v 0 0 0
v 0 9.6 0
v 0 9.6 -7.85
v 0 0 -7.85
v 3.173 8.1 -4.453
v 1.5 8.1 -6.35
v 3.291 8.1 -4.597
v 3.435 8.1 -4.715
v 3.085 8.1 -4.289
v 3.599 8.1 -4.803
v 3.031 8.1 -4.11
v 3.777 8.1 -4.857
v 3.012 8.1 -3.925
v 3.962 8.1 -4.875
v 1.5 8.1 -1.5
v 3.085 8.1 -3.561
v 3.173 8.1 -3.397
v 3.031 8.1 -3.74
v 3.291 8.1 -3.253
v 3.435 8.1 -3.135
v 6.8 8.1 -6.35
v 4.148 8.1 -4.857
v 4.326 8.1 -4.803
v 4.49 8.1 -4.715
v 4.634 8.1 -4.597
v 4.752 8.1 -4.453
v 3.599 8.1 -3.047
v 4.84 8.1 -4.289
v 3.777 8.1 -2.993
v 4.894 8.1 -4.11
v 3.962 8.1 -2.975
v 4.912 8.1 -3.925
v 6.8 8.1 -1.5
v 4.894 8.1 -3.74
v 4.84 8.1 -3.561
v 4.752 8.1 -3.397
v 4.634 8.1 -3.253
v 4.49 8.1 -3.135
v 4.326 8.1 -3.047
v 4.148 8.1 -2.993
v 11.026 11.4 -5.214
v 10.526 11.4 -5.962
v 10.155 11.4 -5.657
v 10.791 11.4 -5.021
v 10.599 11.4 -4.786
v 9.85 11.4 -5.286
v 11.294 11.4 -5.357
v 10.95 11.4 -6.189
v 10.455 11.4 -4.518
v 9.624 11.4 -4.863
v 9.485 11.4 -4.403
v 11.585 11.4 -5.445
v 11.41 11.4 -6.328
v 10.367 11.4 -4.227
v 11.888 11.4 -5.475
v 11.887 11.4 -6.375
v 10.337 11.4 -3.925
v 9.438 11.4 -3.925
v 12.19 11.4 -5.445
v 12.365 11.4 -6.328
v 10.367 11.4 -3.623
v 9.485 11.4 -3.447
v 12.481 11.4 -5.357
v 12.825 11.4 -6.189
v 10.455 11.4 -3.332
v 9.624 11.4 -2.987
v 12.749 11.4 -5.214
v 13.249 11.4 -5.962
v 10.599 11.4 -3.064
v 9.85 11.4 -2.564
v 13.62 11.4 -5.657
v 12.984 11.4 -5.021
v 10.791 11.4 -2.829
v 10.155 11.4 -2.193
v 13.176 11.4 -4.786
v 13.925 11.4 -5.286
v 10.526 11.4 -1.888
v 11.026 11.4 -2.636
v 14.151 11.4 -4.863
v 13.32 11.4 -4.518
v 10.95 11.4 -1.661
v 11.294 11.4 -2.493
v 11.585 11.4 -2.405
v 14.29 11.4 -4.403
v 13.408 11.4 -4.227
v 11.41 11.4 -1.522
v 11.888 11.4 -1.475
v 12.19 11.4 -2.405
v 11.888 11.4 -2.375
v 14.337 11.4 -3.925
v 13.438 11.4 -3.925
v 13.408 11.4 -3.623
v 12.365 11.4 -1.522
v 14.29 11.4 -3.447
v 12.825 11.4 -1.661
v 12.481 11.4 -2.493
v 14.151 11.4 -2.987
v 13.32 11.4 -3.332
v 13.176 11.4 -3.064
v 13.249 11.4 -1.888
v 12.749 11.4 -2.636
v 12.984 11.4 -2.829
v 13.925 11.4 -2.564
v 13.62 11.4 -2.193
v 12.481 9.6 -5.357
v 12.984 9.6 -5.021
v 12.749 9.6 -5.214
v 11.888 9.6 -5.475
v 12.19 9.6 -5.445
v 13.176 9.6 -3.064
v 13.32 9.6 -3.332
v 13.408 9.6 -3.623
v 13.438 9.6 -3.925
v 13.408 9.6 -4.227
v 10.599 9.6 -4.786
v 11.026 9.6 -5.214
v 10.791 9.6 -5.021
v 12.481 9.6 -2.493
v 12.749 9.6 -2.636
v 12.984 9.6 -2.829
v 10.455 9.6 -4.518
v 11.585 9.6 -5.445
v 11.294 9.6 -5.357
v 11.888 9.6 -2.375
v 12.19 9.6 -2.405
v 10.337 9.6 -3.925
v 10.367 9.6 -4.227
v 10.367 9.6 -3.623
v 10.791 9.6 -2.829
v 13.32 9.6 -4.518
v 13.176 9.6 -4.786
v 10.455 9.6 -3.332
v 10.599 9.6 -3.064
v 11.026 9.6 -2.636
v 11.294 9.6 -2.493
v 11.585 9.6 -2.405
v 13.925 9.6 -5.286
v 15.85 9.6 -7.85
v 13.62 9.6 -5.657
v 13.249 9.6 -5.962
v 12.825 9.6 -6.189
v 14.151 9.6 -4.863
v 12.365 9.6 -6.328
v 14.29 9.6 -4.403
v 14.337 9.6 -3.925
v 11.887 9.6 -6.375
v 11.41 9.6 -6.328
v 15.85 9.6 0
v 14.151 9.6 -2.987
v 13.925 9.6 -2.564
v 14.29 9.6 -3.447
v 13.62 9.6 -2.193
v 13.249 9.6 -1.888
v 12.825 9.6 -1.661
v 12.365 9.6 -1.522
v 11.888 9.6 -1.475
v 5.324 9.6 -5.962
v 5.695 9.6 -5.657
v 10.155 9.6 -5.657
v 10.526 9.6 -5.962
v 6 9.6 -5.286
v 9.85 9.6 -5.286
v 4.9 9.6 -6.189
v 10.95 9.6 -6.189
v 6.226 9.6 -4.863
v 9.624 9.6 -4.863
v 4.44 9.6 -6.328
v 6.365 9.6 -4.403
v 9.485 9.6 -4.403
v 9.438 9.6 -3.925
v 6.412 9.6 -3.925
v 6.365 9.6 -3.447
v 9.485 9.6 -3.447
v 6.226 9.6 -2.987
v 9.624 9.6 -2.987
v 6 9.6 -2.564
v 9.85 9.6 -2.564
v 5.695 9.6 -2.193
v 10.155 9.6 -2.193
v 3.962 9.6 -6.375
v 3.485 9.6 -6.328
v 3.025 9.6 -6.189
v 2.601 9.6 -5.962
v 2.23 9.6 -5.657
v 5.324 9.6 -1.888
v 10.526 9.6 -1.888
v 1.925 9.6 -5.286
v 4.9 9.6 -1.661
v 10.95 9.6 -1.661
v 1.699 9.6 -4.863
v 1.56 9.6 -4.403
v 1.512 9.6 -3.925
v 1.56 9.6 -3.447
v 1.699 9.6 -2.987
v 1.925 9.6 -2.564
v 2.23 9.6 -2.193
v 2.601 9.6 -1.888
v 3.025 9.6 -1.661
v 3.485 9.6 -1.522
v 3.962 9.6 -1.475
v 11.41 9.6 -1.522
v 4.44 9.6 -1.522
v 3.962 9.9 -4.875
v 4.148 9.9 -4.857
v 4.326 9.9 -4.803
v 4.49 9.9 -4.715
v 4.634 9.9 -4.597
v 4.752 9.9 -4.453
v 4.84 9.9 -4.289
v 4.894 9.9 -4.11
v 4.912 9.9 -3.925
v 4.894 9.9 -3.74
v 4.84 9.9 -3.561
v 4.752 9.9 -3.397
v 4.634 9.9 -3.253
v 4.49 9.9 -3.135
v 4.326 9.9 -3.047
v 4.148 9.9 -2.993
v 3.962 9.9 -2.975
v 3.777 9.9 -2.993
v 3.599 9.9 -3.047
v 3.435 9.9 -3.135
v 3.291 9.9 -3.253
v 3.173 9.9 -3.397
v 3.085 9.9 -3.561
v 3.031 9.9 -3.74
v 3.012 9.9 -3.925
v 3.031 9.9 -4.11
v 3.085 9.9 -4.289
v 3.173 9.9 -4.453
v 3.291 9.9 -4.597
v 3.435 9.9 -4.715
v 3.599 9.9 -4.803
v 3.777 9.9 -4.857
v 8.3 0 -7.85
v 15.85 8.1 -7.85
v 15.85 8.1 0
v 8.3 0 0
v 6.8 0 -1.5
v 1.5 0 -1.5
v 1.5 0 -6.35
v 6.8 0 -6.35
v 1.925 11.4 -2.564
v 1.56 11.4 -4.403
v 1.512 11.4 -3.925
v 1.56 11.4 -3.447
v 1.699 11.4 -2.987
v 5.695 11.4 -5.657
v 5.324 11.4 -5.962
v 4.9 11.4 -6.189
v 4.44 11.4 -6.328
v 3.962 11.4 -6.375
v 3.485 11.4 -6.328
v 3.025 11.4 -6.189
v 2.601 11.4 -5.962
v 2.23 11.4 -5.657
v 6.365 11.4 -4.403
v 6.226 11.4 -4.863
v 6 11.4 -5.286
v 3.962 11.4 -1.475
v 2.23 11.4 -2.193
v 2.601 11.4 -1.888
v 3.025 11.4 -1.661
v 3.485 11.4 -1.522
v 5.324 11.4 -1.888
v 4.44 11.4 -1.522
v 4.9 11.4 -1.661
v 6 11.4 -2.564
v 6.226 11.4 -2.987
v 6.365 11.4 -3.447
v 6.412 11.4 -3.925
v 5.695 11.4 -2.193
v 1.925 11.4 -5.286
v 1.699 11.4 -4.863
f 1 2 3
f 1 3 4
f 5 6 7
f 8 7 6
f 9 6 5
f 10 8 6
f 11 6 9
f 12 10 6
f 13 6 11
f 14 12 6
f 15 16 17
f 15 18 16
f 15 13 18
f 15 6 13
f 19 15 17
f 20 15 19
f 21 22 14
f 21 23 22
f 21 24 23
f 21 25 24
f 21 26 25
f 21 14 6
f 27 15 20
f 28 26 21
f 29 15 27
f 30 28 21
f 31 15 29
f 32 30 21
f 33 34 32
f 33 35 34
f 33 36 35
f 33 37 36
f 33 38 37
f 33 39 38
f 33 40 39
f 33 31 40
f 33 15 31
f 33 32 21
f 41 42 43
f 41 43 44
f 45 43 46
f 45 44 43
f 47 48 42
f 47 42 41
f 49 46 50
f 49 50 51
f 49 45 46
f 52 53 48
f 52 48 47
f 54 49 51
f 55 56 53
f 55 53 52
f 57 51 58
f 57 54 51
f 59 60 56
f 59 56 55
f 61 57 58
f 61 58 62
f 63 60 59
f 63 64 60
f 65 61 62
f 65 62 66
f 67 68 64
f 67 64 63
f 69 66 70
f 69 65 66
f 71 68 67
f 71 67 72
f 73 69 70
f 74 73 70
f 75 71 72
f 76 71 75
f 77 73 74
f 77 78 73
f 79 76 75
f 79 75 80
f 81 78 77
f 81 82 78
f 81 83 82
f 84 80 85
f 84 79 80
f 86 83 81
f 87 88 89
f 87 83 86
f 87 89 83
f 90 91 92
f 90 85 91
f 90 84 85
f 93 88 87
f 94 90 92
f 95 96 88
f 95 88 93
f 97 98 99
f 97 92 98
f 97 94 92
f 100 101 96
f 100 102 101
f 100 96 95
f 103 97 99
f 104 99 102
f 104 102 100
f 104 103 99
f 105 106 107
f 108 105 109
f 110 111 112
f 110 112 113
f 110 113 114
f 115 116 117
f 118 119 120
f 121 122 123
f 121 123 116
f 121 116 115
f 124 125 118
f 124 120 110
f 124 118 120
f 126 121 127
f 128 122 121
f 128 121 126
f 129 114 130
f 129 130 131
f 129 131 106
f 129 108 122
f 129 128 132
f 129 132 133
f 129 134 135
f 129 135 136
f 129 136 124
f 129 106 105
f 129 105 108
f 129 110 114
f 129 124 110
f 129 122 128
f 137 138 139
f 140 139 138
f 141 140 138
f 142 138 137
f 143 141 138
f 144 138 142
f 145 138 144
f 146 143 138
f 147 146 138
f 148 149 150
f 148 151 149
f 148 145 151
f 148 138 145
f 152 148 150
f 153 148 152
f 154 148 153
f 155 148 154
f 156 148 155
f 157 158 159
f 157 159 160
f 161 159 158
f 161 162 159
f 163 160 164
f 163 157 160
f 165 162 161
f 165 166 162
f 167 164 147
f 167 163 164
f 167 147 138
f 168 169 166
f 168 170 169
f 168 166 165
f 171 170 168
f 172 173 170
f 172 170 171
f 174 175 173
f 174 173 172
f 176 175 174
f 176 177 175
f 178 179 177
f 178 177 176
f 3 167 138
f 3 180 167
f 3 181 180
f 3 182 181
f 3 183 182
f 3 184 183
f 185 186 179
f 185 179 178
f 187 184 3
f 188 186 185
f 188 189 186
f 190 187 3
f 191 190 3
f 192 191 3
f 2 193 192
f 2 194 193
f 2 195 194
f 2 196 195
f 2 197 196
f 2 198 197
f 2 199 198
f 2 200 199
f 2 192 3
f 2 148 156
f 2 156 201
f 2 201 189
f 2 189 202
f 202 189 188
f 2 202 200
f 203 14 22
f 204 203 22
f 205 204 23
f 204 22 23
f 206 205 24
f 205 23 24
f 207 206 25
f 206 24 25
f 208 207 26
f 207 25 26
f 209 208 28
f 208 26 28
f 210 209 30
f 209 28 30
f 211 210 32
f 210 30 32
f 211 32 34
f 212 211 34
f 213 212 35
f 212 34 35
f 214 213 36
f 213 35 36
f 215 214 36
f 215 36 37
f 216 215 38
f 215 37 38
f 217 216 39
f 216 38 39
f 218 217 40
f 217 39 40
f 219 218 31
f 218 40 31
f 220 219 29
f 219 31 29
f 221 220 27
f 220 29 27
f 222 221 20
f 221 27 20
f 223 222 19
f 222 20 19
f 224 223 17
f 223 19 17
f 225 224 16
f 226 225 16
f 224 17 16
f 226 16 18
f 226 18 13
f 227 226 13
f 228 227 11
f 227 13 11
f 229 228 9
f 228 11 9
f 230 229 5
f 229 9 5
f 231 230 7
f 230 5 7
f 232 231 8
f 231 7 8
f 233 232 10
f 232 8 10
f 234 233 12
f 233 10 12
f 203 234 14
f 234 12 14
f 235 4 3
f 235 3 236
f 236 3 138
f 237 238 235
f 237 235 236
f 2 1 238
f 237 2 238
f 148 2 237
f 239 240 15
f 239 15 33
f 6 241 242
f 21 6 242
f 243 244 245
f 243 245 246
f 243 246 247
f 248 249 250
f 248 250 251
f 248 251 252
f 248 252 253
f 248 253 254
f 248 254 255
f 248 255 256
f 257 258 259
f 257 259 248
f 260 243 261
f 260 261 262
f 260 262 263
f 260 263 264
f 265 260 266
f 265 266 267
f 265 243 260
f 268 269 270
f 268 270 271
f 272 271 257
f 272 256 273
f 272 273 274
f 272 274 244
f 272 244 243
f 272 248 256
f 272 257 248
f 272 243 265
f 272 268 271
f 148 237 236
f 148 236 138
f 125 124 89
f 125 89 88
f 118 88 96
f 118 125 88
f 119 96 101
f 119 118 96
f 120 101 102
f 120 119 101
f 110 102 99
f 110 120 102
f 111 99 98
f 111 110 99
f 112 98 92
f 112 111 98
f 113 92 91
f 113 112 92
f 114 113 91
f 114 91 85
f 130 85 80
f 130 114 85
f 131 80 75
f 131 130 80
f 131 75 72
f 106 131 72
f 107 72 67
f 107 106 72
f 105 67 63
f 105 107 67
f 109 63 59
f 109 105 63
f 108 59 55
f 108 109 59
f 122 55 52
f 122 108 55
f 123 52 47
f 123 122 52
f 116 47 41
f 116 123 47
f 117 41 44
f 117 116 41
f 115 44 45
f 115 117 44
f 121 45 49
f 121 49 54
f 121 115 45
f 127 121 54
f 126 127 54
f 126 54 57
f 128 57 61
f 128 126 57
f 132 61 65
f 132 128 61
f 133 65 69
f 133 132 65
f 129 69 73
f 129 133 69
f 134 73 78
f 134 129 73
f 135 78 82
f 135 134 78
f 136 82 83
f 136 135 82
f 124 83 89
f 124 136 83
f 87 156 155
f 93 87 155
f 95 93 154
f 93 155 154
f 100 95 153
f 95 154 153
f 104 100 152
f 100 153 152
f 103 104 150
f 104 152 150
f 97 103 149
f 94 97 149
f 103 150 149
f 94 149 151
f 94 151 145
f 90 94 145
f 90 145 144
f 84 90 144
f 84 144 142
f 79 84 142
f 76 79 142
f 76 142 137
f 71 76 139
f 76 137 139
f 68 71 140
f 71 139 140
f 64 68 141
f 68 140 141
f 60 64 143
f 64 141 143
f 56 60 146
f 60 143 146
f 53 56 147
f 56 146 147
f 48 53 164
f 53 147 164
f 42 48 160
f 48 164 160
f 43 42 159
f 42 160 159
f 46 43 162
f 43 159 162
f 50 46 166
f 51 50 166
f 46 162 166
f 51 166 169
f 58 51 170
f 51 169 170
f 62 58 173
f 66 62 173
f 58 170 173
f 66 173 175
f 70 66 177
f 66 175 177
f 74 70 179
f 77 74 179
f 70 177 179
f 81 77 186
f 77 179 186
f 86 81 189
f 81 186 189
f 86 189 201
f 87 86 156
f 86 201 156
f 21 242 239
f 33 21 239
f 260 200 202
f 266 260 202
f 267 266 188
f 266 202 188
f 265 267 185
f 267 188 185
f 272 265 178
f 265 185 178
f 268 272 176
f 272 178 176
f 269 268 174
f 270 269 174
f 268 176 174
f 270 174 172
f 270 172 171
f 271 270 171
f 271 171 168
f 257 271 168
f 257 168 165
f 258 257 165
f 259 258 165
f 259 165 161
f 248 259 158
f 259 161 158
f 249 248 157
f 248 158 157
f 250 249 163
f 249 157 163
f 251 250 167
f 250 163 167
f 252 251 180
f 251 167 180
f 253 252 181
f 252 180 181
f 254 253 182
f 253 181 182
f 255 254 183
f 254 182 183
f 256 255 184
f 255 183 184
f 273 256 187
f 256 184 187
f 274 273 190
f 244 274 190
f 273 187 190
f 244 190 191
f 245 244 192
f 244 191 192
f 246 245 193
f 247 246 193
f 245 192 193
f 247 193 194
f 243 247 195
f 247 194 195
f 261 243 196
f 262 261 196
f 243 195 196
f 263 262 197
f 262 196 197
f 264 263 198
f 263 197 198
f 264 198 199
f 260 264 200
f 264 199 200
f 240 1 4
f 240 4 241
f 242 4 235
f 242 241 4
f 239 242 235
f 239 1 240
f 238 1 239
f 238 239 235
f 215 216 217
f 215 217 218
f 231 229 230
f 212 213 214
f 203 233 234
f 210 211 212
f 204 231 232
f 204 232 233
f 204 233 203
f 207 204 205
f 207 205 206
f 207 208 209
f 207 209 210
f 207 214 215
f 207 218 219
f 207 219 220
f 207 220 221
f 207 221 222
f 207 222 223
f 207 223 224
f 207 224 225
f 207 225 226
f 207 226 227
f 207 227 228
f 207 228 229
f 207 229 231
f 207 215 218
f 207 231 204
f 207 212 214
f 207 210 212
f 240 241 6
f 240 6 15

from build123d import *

# Parameters (mm, degrees)
BOSS_EXTRUDE1_DEPTH = 7.85
SKETCH5_W           = 5.3
SKETCH5_H           = 4.85
CUT_EXTRUDE1_DEPTH  = 8.1
SKETCH6_R           = 2.45
SKETCH6_R_2         = 1.55
BOSS_EXTRUDE3_DEPTH = 1.8
SKETCH7_R           = 0.95
CUT_EXTRUDE2_DEPTH  = 1.8


with BuildPart() as part:
    # Sketch2 → Boss-Extrude1 (new body)
    with BuildSketch(Plane.XY):
        Polygon((0, 9.6), (0, 0), (8.3, 0), (15.85, 8.1), (15.85, 9.6), align=None)
    extrude(amount=-BOSS_EXTRUDE1_DEPTH)

    # Sketch5 → Cut-Extrude1 (cut)
    with BuildSketch(Plane.XZ):
        with Locations((4.15, -3.925)):
            Rectangle(SKETCH5_W, SKETCH5_H)
    extrude(amount=-CUT_EXTRUDE1_DEPTH, mode=Mode.SUBTRACT)

    # Sketch6 → Boss-Extrude3 (add)
    # profile 1 of 2: a face of its own
    with BuildSketch(Plane(origin=(0, 9.6, 0), x_dir=(1, 0, 0), z_dir=(0, 1, 0))):
        with Locations(Location((3.9625, 3.925, 0), (0, 0, 270))):
            Circle(SKETCH6_R)
    # profile 2 of 2: a face of its own
    with BuildSketch(Plane(origin=(0, 9.6, 0), x_dir=(1, 0, 0), z_dir=(0, 1, 0))):
        with Locations(Location((11.8875, 3.925, 0), (0, 0, 270))):
            Circle(SKETCH6_R)
        with Locations(Location((11.8875, 3.925, 0), (0, 0, 270))):
            Circle(SKETCH6_R_2, mode=Mode.SUBTRACT)
    extrude(amount=BOSS_EXTRUDE3_DEPTH)

    # Sketch7 → Cut-Extrude2 (cut)
    with BuildSketch(Plane.XZ.offset(-8.1)):
        with Locations(Location((3.9625, -3.925, 0), (0, 0, 270))):
            Circle(SKETCH7_R)
    extrude(amount=-CUT_EXTRUDE2_DEPTH, mode=Mode.SUBTRACT)


solid = part.part
